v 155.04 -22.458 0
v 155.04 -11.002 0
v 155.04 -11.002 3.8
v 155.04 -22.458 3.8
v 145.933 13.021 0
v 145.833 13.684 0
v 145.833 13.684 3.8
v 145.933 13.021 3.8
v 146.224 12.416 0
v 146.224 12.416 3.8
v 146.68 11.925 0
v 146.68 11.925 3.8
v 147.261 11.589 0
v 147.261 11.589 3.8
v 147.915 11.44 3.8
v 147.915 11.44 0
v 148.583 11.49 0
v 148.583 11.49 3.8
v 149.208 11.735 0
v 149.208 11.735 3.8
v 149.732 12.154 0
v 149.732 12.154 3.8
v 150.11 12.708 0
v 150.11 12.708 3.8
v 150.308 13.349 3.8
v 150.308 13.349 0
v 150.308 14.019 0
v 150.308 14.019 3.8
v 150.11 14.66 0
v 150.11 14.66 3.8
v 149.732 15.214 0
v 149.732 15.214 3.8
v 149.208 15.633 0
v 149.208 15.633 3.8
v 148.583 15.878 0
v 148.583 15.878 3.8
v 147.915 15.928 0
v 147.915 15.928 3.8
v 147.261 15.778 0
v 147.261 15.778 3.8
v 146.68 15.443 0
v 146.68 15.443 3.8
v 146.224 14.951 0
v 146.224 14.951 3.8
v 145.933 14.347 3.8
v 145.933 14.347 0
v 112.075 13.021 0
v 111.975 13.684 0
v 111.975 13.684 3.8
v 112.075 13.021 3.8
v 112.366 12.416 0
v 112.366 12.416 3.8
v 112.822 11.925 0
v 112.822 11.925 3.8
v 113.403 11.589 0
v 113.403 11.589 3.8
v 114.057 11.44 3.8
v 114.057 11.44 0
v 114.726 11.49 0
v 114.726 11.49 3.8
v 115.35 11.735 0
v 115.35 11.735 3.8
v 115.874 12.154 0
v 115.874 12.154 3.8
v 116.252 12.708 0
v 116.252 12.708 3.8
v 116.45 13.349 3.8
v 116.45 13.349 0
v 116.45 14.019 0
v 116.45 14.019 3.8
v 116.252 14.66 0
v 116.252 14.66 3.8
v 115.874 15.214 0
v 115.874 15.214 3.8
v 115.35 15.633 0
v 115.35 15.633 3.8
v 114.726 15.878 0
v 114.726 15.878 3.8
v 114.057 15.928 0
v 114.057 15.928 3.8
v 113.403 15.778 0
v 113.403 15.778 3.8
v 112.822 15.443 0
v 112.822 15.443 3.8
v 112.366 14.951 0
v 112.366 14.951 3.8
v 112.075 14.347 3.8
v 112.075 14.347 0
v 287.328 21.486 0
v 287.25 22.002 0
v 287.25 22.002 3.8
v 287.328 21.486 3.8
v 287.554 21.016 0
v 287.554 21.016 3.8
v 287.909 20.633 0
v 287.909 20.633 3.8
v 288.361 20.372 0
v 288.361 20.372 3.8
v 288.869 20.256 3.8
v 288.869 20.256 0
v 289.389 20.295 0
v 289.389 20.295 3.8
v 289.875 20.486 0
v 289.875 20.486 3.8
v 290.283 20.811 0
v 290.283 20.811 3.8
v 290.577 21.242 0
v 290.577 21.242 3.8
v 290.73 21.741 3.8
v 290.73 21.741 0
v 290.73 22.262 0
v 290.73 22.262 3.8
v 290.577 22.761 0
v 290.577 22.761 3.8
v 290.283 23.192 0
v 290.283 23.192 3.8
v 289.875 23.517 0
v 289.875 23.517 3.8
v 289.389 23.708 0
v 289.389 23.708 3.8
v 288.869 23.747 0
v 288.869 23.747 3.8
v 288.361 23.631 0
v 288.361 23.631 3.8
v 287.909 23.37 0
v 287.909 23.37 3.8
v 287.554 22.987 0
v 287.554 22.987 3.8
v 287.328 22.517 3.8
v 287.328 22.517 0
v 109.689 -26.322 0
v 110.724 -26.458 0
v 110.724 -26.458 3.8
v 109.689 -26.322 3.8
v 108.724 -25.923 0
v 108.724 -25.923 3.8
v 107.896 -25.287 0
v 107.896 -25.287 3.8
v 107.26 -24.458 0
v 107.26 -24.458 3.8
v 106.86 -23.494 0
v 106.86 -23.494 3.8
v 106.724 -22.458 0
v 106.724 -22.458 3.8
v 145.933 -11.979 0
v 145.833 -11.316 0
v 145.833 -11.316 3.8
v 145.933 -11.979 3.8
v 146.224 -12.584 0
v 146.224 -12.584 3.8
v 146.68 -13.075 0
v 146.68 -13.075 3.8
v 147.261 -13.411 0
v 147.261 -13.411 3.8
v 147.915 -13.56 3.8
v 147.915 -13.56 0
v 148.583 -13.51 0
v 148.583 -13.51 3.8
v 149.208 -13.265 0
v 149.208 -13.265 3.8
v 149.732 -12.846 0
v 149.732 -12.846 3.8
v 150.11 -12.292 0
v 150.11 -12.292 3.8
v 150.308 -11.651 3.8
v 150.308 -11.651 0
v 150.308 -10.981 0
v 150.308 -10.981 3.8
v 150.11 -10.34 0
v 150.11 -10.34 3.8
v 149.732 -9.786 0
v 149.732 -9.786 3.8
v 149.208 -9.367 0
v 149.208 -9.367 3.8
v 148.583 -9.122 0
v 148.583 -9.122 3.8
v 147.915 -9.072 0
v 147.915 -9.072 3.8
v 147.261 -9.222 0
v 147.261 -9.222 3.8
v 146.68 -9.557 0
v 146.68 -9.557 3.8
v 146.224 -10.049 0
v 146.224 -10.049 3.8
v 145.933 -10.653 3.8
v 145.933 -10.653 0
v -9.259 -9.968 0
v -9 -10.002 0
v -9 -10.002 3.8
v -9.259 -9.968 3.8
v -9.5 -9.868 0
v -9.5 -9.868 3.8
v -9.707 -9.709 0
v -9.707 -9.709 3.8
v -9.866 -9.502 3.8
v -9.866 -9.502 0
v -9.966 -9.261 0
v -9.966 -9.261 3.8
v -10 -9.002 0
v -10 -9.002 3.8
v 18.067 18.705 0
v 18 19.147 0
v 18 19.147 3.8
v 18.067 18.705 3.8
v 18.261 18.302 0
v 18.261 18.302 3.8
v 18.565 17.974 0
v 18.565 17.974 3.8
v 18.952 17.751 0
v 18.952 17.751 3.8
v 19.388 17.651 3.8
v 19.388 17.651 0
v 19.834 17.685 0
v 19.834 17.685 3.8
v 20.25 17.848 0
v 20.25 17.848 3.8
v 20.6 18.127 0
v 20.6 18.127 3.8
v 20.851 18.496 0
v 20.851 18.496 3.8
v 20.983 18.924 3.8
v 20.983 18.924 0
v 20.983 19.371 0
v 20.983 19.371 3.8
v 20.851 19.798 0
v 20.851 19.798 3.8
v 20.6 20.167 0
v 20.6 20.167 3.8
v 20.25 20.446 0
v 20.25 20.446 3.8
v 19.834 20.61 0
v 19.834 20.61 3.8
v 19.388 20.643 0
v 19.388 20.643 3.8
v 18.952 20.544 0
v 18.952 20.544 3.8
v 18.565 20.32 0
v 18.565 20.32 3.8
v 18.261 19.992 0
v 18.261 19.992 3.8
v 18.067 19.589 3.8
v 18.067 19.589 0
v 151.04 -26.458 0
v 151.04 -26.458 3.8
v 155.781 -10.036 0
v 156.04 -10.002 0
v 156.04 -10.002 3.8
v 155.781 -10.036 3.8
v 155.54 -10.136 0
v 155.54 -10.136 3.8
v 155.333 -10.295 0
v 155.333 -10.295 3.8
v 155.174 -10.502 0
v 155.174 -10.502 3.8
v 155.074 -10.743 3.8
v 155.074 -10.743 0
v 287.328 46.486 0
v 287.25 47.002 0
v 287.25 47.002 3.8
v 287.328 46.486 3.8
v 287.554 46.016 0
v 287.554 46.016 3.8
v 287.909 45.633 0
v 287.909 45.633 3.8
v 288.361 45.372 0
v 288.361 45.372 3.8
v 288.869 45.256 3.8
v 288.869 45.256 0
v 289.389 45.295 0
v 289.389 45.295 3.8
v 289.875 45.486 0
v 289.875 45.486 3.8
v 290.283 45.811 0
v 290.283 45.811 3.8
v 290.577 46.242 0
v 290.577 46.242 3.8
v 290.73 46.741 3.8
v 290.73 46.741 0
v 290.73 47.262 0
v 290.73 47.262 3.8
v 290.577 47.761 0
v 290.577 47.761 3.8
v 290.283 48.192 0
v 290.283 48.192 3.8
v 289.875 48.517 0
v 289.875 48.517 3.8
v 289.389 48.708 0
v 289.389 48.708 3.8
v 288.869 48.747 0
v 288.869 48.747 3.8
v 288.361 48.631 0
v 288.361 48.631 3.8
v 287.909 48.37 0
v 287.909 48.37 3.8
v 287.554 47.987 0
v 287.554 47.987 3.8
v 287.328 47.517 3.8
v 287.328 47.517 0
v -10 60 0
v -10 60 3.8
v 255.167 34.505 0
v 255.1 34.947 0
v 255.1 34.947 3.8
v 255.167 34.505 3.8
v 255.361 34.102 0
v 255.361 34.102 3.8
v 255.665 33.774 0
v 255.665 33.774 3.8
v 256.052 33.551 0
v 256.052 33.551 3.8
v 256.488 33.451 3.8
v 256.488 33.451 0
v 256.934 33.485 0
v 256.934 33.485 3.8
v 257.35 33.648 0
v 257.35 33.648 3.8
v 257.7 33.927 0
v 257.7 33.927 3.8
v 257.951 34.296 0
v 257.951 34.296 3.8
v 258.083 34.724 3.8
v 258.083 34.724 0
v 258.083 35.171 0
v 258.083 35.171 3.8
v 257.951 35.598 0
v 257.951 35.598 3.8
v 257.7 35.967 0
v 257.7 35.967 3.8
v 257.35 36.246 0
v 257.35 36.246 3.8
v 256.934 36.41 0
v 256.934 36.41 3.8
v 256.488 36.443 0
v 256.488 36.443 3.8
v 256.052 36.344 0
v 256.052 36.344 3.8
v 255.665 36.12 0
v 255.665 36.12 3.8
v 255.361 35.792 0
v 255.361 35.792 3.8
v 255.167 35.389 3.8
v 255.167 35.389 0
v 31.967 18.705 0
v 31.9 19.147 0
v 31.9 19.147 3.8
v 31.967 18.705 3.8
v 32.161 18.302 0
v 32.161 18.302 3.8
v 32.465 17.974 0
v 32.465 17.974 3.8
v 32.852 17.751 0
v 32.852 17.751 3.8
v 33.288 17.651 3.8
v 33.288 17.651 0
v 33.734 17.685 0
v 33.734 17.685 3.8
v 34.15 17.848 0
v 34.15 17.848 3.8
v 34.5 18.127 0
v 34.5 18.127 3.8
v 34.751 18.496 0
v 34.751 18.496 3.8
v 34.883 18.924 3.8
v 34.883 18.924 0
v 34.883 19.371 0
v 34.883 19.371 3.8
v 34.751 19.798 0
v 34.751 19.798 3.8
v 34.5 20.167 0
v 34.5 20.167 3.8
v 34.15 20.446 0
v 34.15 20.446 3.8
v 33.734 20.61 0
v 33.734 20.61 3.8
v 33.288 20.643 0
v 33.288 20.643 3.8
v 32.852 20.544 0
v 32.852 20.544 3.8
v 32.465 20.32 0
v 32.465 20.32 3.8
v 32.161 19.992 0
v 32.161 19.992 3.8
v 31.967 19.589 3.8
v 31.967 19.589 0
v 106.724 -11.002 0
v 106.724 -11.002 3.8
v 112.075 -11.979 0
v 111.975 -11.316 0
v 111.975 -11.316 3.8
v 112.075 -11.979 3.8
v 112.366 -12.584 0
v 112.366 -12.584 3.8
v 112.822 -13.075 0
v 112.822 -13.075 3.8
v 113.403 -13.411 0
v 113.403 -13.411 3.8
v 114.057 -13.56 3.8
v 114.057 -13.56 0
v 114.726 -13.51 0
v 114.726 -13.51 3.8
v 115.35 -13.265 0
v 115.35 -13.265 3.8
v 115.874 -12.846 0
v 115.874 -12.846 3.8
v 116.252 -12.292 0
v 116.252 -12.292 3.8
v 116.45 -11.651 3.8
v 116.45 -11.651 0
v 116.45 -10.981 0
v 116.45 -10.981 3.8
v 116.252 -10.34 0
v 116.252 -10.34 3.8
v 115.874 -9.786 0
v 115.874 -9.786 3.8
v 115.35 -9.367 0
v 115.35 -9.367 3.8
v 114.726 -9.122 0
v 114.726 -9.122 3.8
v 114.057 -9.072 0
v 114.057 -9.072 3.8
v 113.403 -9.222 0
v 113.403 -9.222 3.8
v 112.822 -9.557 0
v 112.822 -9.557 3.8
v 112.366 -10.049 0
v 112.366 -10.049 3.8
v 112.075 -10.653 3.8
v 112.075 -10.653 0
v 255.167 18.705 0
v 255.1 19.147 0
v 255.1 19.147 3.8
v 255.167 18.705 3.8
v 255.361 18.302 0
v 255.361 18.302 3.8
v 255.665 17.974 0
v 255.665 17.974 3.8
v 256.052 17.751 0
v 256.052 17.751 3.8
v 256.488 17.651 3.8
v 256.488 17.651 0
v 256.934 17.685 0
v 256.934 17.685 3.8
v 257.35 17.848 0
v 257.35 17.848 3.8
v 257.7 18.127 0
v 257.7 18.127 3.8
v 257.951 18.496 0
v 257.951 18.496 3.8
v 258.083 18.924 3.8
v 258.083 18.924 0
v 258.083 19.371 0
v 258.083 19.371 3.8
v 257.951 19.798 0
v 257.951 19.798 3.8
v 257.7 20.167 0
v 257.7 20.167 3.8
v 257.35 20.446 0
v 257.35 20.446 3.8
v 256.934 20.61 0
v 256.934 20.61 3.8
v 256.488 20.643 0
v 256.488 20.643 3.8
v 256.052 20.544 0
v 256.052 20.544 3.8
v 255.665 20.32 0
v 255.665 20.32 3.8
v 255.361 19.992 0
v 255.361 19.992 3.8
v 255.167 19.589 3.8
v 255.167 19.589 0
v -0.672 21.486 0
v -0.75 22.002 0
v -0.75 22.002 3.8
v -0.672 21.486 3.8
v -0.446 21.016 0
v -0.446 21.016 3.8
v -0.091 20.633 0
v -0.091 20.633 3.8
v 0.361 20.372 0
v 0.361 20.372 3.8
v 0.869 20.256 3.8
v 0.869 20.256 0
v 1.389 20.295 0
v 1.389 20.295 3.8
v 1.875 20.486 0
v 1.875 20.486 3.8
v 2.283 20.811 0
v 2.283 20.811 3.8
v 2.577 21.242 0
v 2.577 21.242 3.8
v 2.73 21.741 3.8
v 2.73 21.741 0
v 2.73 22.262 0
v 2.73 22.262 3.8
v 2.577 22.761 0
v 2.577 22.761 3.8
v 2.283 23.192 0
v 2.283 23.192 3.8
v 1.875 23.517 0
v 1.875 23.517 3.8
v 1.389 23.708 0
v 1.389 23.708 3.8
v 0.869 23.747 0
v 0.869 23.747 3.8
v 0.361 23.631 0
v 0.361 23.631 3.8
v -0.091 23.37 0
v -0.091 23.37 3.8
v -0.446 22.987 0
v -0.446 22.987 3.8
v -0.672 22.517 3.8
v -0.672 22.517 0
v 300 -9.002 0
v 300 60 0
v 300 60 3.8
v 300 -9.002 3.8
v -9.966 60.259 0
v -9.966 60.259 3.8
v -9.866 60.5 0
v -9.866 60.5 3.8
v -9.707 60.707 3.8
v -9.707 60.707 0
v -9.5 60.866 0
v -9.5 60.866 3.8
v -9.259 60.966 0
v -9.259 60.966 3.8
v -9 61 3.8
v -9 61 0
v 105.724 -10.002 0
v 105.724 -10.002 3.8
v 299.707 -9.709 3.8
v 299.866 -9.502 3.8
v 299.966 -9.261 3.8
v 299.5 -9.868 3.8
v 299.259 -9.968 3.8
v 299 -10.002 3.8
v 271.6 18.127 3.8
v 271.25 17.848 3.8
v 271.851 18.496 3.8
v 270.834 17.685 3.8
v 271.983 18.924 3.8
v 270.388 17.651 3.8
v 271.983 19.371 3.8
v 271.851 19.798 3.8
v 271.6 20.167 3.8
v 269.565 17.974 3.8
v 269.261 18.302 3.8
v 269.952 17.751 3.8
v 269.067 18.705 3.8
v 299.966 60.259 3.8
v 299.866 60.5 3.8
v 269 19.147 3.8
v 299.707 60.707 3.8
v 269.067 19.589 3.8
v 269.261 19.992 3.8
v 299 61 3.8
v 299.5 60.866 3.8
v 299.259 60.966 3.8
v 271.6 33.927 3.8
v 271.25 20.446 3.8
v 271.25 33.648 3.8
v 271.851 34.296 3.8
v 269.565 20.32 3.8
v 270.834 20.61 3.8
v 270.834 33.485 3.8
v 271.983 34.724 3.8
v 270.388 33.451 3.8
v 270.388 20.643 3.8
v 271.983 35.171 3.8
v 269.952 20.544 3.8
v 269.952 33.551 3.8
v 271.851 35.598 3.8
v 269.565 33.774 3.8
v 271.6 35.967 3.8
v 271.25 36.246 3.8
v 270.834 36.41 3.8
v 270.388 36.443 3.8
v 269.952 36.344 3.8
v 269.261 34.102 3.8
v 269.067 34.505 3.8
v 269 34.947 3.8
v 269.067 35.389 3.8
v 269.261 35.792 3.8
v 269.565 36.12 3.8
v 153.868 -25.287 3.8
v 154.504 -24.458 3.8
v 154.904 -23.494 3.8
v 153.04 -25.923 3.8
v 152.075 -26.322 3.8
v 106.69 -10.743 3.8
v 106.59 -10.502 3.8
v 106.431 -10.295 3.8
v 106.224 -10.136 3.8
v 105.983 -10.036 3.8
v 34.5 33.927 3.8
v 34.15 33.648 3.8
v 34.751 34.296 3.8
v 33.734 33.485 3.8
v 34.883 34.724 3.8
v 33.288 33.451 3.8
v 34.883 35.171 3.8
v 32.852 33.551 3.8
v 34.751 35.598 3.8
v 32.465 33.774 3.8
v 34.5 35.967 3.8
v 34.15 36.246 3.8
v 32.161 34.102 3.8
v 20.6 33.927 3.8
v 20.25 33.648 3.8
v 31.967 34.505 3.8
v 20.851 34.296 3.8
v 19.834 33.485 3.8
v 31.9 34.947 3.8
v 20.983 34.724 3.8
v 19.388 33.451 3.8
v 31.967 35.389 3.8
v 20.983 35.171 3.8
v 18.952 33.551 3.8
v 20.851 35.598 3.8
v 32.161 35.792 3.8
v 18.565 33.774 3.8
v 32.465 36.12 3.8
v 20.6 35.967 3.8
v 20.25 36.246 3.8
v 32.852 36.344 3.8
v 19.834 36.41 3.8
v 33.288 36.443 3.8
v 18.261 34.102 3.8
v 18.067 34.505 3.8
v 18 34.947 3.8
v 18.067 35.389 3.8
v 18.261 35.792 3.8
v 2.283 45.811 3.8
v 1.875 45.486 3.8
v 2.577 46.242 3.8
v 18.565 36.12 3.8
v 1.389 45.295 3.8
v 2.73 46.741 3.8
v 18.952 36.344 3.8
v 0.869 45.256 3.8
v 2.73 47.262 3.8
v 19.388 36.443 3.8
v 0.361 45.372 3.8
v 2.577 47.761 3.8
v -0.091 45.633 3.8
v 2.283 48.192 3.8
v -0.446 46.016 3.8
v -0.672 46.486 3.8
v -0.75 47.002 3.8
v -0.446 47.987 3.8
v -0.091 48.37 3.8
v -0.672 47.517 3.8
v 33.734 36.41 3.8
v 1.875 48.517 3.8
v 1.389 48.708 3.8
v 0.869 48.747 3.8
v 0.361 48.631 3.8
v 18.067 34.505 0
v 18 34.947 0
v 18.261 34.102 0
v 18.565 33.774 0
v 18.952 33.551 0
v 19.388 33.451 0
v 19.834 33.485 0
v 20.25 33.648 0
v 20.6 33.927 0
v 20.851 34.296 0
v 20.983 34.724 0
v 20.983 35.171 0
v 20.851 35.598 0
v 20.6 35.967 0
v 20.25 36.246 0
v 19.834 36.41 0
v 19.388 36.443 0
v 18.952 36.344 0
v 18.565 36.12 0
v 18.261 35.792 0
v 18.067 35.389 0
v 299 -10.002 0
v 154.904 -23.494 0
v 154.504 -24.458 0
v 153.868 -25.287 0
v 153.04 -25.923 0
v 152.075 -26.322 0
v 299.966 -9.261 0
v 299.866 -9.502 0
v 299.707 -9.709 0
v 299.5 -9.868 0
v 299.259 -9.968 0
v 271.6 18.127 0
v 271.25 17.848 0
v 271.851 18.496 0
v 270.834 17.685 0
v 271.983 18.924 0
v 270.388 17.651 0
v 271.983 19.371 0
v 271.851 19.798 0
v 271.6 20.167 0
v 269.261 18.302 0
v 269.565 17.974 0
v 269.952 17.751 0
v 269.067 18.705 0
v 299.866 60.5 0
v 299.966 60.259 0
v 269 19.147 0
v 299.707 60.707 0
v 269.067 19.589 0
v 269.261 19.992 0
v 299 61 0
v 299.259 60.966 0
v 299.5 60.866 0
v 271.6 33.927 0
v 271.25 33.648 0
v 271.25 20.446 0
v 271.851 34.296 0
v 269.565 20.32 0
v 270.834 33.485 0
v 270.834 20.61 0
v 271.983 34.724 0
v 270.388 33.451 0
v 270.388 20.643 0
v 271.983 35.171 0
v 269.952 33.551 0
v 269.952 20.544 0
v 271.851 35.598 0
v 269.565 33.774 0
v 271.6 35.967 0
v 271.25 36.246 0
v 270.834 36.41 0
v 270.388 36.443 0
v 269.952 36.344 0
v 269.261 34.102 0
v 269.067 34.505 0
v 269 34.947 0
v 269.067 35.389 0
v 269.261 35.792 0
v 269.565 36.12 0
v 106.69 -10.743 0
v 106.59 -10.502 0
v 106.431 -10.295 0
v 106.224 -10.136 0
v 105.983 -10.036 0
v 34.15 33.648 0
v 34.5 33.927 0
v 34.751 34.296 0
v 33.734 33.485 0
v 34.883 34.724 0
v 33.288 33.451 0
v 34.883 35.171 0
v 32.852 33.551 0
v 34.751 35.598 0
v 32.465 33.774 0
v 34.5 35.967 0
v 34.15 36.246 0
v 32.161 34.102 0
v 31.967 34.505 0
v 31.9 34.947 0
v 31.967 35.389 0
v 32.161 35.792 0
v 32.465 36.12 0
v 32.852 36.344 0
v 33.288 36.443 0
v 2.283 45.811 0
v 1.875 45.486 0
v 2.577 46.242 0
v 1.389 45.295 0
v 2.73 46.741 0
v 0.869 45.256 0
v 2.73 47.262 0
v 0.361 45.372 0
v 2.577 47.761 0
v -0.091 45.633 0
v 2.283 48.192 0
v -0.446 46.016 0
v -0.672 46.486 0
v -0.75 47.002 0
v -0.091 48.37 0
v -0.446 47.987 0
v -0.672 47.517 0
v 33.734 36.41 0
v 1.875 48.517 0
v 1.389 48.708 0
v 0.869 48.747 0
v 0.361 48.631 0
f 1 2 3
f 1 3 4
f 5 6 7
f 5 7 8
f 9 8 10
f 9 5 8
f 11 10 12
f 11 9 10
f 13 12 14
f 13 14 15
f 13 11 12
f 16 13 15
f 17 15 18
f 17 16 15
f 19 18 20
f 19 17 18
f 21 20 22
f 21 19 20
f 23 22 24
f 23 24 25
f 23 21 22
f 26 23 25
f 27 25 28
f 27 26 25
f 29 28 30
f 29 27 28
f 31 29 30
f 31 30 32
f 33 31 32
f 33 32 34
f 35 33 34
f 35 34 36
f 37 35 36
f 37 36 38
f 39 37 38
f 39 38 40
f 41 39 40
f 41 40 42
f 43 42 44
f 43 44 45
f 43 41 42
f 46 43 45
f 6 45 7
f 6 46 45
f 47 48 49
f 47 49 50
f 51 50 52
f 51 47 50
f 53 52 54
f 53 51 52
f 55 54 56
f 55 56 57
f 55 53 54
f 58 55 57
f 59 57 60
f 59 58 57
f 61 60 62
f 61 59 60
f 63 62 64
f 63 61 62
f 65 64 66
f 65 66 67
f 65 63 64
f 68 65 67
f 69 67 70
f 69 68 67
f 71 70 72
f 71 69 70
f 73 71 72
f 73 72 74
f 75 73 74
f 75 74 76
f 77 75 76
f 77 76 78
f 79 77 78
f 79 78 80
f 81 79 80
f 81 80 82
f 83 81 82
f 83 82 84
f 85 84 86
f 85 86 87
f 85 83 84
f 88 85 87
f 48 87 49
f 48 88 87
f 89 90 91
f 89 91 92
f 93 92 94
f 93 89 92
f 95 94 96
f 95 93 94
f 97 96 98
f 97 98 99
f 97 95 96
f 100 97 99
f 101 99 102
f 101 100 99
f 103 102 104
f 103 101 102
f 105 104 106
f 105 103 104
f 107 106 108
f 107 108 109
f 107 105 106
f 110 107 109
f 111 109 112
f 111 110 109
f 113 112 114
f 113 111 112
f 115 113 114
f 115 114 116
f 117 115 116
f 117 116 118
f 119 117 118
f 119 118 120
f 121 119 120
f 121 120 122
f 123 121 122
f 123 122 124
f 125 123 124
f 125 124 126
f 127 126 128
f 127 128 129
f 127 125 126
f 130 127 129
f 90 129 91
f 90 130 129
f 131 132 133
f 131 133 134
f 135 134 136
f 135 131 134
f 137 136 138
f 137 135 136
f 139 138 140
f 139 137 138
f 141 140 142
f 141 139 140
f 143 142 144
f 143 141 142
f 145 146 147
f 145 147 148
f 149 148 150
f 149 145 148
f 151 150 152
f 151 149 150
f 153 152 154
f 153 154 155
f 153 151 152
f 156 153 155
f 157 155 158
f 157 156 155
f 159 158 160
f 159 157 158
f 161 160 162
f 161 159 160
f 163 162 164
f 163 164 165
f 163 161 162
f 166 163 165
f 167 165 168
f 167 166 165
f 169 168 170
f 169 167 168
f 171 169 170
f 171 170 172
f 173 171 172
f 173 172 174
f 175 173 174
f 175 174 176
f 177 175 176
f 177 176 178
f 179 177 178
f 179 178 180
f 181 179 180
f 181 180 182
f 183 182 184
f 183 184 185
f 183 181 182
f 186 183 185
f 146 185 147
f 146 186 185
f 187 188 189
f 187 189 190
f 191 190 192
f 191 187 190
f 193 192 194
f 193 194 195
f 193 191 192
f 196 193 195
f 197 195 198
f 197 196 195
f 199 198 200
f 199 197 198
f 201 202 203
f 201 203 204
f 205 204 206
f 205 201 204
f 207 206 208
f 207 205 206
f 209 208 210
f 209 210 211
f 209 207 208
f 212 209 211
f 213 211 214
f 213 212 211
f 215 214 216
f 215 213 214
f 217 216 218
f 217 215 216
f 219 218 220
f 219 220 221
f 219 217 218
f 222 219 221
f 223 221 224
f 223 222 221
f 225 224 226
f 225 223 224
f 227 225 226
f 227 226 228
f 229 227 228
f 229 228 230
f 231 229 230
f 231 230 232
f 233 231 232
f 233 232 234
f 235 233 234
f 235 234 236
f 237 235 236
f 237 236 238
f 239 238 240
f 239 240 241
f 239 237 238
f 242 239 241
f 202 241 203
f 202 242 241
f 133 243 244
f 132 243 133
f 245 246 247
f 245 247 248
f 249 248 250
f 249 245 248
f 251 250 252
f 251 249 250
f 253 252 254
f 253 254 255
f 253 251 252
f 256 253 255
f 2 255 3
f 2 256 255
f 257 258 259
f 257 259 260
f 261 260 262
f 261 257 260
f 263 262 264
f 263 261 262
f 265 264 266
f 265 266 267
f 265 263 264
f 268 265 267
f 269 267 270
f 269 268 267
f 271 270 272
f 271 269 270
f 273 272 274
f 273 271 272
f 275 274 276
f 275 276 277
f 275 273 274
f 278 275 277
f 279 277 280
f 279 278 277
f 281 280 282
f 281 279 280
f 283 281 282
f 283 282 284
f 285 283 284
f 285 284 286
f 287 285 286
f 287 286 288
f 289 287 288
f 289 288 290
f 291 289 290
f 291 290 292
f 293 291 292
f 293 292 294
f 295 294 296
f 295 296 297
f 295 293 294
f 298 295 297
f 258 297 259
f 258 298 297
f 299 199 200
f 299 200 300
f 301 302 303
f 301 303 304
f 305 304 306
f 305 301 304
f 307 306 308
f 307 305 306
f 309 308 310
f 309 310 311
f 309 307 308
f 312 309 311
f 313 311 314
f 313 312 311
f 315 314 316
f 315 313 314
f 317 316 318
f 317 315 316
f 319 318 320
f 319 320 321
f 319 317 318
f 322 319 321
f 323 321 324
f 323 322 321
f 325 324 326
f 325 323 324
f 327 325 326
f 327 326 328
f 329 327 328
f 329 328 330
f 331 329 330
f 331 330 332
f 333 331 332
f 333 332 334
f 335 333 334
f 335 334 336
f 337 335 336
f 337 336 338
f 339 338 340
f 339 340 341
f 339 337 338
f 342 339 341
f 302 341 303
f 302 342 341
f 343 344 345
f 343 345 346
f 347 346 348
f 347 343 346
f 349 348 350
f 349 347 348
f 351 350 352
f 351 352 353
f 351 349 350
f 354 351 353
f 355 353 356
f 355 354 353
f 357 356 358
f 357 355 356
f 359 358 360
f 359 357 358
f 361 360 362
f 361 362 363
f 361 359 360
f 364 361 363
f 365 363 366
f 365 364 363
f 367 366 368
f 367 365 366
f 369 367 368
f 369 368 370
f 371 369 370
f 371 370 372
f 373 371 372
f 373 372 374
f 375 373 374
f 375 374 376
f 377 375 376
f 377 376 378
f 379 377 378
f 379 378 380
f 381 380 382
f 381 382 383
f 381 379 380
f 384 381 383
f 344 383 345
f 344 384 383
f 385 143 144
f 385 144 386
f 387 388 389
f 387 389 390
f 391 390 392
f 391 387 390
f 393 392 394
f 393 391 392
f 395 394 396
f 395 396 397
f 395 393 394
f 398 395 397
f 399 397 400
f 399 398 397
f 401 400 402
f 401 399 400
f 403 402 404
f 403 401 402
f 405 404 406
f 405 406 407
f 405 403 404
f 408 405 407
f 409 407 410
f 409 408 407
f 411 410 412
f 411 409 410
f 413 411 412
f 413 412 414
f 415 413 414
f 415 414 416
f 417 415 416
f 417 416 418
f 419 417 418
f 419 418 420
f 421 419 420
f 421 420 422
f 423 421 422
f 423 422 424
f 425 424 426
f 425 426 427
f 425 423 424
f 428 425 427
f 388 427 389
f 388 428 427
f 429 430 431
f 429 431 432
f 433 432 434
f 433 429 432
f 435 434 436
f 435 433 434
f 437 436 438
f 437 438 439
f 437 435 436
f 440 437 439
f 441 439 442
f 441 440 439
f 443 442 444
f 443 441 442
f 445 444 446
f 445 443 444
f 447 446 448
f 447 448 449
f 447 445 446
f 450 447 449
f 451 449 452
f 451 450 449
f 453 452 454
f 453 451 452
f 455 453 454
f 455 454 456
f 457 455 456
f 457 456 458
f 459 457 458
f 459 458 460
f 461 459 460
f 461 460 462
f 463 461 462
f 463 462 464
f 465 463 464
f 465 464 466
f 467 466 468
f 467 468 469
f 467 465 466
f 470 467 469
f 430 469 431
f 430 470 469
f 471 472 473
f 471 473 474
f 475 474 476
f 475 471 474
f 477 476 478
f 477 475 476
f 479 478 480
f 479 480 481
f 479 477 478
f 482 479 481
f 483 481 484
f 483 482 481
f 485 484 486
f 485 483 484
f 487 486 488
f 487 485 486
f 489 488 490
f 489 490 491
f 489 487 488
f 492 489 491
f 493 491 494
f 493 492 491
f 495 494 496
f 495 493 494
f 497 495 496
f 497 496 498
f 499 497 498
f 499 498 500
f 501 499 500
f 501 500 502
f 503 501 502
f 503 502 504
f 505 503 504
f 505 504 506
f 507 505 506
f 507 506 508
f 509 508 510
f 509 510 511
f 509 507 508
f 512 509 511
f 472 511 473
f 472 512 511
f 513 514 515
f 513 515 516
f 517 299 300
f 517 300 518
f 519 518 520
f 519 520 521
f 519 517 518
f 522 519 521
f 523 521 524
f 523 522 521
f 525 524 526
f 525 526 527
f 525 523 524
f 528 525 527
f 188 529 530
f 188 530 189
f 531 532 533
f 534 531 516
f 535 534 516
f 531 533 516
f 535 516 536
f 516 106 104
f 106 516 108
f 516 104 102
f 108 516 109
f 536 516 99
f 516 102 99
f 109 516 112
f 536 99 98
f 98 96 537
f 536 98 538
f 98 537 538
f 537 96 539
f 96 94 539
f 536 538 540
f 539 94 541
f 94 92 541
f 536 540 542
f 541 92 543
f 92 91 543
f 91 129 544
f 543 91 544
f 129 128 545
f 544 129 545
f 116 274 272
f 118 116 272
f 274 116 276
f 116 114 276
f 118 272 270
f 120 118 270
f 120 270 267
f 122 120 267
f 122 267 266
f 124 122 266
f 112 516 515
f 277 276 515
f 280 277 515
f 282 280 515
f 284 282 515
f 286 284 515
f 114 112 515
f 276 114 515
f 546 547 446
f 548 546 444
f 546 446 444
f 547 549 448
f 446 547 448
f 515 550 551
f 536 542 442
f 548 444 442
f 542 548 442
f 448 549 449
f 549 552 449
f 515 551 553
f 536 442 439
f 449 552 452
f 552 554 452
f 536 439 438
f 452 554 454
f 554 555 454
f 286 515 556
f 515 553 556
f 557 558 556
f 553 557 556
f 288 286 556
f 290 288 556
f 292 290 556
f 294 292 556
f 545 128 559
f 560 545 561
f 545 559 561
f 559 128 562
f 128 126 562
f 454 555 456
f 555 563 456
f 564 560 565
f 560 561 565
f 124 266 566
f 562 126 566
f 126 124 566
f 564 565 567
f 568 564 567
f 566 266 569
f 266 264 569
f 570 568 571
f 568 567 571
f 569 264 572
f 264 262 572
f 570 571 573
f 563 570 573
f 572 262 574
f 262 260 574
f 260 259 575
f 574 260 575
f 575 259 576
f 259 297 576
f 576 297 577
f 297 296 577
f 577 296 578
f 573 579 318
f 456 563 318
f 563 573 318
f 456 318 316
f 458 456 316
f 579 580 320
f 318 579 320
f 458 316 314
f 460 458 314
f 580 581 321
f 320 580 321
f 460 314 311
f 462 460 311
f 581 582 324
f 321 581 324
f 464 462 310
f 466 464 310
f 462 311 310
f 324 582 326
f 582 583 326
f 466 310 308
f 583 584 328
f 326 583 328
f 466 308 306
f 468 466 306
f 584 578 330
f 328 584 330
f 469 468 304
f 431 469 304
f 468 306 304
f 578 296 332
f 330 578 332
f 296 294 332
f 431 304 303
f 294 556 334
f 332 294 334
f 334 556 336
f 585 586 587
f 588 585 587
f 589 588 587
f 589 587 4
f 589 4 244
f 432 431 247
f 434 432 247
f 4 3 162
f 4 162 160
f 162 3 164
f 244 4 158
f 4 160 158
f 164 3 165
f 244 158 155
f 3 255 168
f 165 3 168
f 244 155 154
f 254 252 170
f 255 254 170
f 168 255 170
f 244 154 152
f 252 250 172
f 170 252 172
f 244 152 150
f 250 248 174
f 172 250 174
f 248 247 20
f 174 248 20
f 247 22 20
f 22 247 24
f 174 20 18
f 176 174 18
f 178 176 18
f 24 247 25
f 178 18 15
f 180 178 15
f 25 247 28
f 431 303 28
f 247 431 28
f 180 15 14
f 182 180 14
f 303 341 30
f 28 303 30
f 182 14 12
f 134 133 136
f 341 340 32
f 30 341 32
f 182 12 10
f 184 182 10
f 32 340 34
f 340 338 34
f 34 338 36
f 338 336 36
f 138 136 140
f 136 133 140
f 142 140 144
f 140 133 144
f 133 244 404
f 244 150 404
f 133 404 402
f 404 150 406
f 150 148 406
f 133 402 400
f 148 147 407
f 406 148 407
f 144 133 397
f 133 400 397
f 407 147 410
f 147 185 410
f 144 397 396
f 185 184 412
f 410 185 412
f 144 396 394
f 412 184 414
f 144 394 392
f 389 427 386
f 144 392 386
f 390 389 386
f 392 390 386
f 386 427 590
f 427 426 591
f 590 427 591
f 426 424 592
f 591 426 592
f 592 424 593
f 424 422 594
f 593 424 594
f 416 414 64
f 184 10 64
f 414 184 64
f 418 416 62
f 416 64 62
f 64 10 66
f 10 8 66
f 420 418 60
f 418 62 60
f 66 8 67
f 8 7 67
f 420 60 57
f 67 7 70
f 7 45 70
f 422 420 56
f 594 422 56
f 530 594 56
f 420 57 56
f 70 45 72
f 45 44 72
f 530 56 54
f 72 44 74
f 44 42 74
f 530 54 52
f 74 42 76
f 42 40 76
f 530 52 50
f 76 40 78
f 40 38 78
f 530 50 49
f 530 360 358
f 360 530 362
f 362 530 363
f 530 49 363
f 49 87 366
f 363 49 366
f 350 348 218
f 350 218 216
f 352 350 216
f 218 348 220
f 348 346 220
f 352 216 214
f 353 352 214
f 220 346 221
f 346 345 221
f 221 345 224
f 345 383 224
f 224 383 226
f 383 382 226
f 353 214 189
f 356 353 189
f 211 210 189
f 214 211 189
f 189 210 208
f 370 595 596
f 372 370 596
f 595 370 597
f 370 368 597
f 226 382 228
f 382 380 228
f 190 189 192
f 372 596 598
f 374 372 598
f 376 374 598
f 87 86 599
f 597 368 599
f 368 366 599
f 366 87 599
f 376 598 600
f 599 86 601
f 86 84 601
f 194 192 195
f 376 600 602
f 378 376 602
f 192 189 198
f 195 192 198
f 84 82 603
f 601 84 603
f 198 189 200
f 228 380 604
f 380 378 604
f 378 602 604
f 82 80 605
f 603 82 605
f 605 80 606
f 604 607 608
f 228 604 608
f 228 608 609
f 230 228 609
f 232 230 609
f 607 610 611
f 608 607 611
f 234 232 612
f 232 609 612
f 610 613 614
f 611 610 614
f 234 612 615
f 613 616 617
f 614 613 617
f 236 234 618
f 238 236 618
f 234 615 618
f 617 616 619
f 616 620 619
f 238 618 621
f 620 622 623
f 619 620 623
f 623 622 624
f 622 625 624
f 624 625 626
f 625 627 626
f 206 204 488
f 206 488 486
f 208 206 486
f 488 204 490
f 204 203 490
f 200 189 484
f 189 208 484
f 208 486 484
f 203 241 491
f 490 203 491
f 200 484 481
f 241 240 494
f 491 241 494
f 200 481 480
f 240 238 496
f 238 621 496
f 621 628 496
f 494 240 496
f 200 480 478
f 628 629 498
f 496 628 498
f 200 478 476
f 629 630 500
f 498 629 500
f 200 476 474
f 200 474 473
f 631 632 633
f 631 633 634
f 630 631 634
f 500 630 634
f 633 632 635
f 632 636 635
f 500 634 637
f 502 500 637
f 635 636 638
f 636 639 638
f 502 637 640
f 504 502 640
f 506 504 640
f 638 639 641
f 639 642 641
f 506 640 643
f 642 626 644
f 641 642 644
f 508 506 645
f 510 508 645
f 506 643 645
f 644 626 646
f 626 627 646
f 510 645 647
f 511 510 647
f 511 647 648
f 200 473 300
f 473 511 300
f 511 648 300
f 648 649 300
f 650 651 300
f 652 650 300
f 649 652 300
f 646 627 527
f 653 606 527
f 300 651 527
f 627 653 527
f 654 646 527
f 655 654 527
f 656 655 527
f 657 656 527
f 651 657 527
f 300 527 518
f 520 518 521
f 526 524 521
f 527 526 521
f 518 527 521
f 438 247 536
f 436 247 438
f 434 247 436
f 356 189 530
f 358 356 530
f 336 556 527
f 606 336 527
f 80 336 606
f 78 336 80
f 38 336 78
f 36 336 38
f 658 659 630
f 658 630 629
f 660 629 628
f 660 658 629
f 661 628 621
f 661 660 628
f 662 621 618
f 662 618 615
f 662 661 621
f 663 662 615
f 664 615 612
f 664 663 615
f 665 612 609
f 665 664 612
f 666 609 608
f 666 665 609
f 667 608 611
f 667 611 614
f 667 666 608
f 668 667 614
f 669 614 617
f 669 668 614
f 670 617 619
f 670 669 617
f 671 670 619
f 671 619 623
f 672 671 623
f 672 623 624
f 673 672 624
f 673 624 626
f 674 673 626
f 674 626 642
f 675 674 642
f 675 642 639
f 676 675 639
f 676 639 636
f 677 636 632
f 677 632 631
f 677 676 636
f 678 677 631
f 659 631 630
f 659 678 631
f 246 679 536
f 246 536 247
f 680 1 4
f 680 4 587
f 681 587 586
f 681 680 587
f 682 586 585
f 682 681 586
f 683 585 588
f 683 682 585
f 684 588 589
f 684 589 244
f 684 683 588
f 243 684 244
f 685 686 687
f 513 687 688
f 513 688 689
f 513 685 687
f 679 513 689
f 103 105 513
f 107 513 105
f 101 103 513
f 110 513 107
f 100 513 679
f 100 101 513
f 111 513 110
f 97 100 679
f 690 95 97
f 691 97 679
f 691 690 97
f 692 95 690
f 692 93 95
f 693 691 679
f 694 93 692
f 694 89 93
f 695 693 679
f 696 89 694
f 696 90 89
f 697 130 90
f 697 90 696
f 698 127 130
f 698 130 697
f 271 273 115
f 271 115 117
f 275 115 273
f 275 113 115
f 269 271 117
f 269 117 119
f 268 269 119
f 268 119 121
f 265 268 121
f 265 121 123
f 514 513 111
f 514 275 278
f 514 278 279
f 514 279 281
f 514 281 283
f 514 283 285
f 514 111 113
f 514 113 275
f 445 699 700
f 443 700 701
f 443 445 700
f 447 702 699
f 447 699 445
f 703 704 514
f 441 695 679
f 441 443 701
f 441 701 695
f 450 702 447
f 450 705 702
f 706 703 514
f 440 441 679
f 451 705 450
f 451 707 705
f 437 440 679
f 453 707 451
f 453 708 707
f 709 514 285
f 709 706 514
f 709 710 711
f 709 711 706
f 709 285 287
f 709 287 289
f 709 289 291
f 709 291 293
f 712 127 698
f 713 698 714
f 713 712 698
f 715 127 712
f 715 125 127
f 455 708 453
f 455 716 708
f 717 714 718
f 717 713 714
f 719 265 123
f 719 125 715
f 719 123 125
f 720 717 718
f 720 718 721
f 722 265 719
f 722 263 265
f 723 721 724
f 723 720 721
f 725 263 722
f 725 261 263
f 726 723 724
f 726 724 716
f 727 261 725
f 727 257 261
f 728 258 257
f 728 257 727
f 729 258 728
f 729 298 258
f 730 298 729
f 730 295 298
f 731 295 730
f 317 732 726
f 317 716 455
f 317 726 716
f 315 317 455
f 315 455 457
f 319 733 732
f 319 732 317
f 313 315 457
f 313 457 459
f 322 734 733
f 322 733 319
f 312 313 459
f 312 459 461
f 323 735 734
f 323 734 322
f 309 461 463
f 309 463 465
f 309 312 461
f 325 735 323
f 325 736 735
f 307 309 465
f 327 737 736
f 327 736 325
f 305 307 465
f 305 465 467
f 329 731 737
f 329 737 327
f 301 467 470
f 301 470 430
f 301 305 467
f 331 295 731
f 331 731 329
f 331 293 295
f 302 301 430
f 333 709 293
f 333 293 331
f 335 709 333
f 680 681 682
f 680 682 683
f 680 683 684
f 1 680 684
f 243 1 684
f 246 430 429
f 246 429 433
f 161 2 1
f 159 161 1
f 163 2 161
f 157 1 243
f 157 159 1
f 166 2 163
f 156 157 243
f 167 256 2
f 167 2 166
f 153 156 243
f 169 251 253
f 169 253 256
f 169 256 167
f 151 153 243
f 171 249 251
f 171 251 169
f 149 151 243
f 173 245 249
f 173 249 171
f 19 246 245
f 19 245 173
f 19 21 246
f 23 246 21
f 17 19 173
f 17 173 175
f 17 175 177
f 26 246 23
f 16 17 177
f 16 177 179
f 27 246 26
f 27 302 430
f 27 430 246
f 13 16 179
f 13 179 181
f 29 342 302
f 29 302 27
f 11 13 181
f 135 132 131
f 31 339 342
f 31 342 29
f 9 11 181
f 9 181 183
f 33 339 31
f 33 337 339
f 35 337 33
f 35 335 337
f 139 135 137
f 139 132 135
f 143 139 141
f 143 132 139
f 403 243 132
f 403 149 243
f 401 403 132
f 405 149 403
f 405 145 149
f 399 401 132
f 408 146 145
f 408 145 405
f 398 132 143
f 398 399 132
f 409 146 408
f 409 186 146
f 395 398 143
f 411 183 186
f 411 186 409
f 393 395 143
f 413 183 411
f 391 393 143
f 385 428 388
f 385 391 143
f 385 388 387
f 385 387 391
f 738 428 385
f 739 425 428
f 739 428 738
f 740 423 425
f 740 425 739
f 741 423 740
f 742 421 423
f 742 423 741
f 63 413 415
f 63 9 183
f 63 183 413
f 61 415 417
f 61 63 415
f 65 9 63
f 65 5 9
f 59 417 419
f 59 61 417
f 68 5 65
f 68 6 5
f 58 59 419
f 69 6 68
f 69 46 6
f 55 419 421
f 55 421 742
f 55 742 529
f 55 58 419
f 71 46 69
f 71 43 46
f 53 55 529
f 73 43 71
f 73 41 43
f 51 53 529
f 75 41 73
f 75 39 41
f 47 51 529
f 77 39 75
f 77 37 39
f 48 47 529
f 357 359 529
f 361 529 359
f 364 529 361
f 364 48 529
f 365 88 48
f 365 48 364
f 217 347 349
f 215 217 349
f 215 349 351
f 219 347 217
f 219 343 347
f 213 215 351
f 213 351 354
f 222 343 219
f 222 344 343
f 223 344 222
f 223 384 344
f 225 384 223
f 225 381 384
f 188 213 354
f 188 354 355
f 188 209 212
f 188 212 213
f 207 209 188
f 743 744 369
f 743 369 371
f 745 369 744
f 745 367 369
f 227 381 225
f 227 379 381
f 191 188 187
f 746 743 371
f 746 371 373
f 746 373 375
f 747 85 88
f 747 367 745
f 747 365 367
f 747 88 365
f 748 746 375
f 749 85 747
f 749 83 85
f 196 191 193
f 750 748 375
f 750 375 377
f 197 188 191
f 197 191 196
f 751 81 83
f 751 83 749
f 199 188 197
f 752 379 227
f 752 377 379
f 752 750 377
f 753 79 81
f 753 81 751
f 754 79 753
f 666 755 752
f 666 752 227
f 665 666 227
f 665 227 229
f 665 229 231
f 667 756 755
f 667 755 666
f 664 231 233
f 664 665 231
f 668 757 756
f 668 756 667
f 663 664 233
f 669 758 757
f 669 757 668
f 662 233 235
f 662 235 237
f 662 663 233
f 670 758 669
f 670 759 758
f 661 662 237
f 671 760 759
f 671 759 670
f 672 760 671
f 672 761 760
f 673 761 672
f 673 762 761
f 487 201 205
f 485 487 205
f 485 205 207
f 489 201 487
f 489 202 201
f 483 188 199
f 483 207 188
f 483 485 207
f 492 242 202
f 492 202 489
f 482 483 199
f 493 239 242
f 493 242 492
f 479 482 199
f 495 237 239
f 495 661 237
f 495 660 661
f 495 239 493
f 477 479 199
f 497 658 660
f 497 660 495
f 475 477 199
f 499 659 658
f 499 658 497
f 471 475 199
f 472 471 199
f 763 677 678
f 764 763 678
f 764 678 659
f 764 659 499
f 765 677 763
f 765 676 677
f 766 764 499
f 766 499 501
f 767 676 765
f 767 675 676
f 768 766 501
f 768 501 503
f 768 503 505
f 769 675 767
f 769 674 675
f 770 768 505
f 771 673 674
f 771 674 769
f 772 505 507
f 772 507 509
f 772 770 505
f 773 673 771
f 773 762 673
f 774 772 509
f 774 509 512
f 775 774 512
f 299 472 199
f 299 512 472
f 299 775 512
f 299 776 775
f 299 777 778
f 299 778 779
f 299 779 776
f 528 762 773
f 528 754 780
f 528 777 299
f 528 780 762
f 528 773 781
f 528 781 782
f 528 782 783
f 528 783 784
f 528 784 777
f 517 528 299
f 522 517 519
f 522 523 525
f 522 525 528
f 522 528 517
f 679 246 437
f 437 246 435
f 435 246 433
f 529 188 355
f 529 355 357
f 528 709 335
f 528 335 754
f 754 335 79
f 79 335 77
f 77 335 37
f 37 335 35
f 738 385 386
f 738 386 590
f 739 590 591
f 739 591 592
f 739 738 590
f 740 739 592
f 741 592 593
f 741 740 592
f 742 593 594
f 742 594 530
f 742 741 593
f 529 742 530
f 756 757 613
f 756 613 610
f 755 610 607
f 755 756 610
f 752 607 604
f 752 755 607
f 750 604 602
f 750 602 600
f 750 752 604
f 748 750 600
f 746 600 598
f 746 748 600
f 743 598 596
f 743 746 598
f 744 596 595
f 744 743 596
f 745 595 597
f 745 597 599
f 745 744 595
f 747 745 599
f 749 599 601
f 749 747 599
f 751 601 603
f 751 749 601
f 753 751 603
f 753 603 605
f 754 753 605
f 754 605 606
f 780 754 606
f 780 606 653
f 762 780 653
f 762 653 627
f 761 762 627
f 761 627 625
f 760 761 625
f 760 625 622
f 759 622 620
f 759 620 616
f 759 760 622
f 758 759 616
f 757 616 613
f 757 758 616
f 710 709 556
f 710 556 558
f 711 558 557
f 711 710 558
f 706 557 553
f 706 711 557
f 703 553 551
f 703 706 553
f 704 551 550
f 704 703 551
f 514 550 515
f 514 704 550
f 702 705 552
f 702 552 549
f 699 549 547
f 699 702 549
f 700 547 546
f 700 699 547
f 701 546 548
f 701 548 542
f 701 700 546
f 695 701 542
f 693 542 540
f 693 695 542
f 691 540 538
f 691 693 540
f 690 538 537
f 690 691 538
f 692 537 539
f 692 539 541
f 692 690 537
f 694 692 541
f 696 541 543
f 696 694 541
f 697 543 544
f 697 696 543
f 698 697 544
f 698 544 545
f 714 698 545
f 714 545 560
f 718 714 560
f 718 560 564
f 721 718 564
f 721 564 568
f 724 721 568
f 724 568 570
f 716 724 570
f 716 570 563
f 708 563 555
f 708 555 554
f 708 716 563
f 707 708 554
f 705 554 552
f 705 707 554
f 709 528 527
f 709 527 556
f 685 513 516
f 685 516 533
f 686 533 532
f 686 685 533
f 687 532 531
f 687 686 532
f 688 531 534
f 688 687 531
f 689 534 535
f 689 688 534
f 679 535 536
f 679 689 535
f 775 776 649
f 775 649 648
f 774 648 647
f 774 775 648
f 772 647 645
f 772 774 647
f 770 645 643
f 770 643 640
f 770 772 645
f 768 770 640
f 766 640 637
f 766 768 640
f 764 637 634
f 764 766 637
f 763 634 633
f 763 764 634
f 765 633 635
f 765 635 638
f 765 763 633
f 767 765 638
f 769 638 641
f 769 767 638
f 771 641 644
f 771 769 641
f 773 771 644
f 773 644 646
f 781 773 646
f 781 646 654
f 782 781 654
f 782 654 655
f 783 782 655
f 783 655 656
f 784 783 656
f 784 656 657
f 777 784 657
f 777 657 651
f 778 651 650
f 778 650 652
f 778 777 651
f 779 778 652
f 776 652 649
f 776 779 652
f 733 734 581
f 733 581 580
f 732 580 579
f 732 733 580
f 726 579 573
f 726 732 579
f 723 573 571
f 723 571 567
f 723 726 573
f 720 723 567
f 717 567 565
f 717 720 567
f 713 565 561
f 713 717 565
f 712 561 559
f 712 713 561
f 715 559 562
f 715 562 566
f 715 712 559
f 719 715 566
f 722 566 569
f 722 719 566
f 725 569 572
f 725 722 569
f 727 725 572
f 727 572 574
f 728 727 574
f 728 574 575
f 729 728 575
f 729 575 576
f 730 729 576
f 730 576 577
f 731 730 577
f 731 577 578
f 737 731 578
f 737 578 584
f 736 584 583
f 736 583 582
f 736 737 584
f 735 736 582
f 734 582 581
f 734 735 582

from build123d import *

# Parameters (mm, degrees)
SKETCH1_R           = 1.75
SKETCH1_R_2         = 2.25
SKETCH1_R_3         = 1.5
BOSS_EXTRUDE1_DEPTH = 3.8


with BuildPart() as part:
    # Sketch1 → Boss-Extrude1 (new body)
    with BuildSketch(Plane.XY):
        with BuildLine():
            Line((299, -10.001863855), (156.039811852, -10.001863855))
            ThreePointArc((156.039811852, -10.001863855), (155.33270507, -10.294757074), (155.039811852, -11.001863855))
            Line((155.039811852, -11.001863855), (155.039811852, -22.458474266))
            ThreePointArc((155.039811852, -22.458474266), (153.868238976, -25.286901391), (151.039811852, -26.458474266))
            Line((151.039811852, -26.458474266), (110.724043242, -26.458474266))
            ThreePointArc((110.724043242, -26.458474266), (107.895616117, -25.286901391), (106.724043242, -22.458474266))
            Line((106.724043242, -22.458474266), (106.724043242, -11.001863855))
            ThreePointArc((106.724043242, -11.001863855), (106.431150023, -10.294757074), (105.724043242, -10.001863855))
            Line((105.724043242, -10.001863855), (-9, -10.001863855))
            ThreePointArc((-9, -10.001863855), (-9.707106781, -9.708970637), (-10, -9.001863855))
            Line((-10, -9.001863855), (-10, 60))
            ThreePointArc((-10, 60), (-9.707106781, 60.707106781), (-9, 61))
            Line((-9, 61), (299, 61))
            ThreePointArc((299, 61), (299.707106781, 60.707106781), (300, 60))
            Line((300, 60), (300, -9.001863855))
            ThreePointArc((300, -9.001863855), (299.707106781, -9.708970637), (299, -10.001863855))
        make_face()
        with Locations(Location((289, 22.001504258, 0), (0, 0, 180))):
            Circle(SKETCH1_R, mode=Mode.SUBTRACT)
        with Locations(Location((289, 47.001504258, 0), (0, 0, 180))):
            Circle(SKETCH1_R, mode=Mode.SUBTRACT)
        with Locations(Location((148.082820817, -11.316051766, 0), (0, 0, 180))):
            Circle(SKETCH1_R_2, mode=Mode.SUBTRACT)
        with Locations(Location((148.082820817, 13.683948234, 0), (0, 0, 180))):
            Circle(SKETCH1_R_2, mode=Mode.SUBTRACT)
        with Locations(Location((114.224914373, 13.683948234, 0), (0, 0, 180))):
            Circle(SKETCH1_R_2, mode=Mode.SUBTRACT)
        with Locations(Location((114.224914373, -11.316051766, 0), (0, 0, 180))):
            Circle(SKETCH1_R_2, mode=Mode.SUBTRACT)
        with Locations(Location((256.6, 19.147207957, 0), (0, 0, 180))):
            Circle(SKETCH1_R_3, mode=Mode.SUBTRACT)
        with Locations(Location((270.5, 19.147207957, 0), (0, 0, 180))):
            Circle(SKETCH1_R_3, mode=Mode.SUBTRACT)
        with Locations(Location((270.5, 34.947207957, 0), (0, 0, 180))):
            Circle(SKETCH1_R_3, mode=Mode.SUBTRACT)
        with Locations(Location((256.6, 34.947207957, 0), (0, 0, 180))):
            Circle(SKETCH1_R_3, mode=Mode.SUBTRACT)
        with Locations(Location((33.4, 34.947207957, 0), (0, 0, 180))):
            Circle(SKETCH1_R_3, mode=Mode.SUBTRACT)
        with Locations(Location((19.5, 34.947207957, 0), (0, 0, 180))):
            Circle(SKETCH1_R_3, mode=Mode.SUBTRACT)
        with Locations(Location((19.5, 19.147207957, 0), (0, 0, 180))):
            Circle(SKETCH1_R_3, mode=Mode.SUBTRACT)
        with Locations(Location((33.4, 19.147207957, 0), (0, 0, 180))):
            Circle(SKETCH1_R_3, mode=Mode.SUBTRACT)
        with Locations(Location((1, 47.001504258, 0), (0, 0, 180))):
            Circle(SKETCH1_R, mode=Mode.SUBTRACT)
        with Locations(Location((1, 22.001504258, 0), (0, 0, 180))):
            Circle(SKETCH1_R, mode=Mode.SUBTRACT)
    extrude(amount=BOSS_EXTRUDE1_DEPTH)


solid = part.part
